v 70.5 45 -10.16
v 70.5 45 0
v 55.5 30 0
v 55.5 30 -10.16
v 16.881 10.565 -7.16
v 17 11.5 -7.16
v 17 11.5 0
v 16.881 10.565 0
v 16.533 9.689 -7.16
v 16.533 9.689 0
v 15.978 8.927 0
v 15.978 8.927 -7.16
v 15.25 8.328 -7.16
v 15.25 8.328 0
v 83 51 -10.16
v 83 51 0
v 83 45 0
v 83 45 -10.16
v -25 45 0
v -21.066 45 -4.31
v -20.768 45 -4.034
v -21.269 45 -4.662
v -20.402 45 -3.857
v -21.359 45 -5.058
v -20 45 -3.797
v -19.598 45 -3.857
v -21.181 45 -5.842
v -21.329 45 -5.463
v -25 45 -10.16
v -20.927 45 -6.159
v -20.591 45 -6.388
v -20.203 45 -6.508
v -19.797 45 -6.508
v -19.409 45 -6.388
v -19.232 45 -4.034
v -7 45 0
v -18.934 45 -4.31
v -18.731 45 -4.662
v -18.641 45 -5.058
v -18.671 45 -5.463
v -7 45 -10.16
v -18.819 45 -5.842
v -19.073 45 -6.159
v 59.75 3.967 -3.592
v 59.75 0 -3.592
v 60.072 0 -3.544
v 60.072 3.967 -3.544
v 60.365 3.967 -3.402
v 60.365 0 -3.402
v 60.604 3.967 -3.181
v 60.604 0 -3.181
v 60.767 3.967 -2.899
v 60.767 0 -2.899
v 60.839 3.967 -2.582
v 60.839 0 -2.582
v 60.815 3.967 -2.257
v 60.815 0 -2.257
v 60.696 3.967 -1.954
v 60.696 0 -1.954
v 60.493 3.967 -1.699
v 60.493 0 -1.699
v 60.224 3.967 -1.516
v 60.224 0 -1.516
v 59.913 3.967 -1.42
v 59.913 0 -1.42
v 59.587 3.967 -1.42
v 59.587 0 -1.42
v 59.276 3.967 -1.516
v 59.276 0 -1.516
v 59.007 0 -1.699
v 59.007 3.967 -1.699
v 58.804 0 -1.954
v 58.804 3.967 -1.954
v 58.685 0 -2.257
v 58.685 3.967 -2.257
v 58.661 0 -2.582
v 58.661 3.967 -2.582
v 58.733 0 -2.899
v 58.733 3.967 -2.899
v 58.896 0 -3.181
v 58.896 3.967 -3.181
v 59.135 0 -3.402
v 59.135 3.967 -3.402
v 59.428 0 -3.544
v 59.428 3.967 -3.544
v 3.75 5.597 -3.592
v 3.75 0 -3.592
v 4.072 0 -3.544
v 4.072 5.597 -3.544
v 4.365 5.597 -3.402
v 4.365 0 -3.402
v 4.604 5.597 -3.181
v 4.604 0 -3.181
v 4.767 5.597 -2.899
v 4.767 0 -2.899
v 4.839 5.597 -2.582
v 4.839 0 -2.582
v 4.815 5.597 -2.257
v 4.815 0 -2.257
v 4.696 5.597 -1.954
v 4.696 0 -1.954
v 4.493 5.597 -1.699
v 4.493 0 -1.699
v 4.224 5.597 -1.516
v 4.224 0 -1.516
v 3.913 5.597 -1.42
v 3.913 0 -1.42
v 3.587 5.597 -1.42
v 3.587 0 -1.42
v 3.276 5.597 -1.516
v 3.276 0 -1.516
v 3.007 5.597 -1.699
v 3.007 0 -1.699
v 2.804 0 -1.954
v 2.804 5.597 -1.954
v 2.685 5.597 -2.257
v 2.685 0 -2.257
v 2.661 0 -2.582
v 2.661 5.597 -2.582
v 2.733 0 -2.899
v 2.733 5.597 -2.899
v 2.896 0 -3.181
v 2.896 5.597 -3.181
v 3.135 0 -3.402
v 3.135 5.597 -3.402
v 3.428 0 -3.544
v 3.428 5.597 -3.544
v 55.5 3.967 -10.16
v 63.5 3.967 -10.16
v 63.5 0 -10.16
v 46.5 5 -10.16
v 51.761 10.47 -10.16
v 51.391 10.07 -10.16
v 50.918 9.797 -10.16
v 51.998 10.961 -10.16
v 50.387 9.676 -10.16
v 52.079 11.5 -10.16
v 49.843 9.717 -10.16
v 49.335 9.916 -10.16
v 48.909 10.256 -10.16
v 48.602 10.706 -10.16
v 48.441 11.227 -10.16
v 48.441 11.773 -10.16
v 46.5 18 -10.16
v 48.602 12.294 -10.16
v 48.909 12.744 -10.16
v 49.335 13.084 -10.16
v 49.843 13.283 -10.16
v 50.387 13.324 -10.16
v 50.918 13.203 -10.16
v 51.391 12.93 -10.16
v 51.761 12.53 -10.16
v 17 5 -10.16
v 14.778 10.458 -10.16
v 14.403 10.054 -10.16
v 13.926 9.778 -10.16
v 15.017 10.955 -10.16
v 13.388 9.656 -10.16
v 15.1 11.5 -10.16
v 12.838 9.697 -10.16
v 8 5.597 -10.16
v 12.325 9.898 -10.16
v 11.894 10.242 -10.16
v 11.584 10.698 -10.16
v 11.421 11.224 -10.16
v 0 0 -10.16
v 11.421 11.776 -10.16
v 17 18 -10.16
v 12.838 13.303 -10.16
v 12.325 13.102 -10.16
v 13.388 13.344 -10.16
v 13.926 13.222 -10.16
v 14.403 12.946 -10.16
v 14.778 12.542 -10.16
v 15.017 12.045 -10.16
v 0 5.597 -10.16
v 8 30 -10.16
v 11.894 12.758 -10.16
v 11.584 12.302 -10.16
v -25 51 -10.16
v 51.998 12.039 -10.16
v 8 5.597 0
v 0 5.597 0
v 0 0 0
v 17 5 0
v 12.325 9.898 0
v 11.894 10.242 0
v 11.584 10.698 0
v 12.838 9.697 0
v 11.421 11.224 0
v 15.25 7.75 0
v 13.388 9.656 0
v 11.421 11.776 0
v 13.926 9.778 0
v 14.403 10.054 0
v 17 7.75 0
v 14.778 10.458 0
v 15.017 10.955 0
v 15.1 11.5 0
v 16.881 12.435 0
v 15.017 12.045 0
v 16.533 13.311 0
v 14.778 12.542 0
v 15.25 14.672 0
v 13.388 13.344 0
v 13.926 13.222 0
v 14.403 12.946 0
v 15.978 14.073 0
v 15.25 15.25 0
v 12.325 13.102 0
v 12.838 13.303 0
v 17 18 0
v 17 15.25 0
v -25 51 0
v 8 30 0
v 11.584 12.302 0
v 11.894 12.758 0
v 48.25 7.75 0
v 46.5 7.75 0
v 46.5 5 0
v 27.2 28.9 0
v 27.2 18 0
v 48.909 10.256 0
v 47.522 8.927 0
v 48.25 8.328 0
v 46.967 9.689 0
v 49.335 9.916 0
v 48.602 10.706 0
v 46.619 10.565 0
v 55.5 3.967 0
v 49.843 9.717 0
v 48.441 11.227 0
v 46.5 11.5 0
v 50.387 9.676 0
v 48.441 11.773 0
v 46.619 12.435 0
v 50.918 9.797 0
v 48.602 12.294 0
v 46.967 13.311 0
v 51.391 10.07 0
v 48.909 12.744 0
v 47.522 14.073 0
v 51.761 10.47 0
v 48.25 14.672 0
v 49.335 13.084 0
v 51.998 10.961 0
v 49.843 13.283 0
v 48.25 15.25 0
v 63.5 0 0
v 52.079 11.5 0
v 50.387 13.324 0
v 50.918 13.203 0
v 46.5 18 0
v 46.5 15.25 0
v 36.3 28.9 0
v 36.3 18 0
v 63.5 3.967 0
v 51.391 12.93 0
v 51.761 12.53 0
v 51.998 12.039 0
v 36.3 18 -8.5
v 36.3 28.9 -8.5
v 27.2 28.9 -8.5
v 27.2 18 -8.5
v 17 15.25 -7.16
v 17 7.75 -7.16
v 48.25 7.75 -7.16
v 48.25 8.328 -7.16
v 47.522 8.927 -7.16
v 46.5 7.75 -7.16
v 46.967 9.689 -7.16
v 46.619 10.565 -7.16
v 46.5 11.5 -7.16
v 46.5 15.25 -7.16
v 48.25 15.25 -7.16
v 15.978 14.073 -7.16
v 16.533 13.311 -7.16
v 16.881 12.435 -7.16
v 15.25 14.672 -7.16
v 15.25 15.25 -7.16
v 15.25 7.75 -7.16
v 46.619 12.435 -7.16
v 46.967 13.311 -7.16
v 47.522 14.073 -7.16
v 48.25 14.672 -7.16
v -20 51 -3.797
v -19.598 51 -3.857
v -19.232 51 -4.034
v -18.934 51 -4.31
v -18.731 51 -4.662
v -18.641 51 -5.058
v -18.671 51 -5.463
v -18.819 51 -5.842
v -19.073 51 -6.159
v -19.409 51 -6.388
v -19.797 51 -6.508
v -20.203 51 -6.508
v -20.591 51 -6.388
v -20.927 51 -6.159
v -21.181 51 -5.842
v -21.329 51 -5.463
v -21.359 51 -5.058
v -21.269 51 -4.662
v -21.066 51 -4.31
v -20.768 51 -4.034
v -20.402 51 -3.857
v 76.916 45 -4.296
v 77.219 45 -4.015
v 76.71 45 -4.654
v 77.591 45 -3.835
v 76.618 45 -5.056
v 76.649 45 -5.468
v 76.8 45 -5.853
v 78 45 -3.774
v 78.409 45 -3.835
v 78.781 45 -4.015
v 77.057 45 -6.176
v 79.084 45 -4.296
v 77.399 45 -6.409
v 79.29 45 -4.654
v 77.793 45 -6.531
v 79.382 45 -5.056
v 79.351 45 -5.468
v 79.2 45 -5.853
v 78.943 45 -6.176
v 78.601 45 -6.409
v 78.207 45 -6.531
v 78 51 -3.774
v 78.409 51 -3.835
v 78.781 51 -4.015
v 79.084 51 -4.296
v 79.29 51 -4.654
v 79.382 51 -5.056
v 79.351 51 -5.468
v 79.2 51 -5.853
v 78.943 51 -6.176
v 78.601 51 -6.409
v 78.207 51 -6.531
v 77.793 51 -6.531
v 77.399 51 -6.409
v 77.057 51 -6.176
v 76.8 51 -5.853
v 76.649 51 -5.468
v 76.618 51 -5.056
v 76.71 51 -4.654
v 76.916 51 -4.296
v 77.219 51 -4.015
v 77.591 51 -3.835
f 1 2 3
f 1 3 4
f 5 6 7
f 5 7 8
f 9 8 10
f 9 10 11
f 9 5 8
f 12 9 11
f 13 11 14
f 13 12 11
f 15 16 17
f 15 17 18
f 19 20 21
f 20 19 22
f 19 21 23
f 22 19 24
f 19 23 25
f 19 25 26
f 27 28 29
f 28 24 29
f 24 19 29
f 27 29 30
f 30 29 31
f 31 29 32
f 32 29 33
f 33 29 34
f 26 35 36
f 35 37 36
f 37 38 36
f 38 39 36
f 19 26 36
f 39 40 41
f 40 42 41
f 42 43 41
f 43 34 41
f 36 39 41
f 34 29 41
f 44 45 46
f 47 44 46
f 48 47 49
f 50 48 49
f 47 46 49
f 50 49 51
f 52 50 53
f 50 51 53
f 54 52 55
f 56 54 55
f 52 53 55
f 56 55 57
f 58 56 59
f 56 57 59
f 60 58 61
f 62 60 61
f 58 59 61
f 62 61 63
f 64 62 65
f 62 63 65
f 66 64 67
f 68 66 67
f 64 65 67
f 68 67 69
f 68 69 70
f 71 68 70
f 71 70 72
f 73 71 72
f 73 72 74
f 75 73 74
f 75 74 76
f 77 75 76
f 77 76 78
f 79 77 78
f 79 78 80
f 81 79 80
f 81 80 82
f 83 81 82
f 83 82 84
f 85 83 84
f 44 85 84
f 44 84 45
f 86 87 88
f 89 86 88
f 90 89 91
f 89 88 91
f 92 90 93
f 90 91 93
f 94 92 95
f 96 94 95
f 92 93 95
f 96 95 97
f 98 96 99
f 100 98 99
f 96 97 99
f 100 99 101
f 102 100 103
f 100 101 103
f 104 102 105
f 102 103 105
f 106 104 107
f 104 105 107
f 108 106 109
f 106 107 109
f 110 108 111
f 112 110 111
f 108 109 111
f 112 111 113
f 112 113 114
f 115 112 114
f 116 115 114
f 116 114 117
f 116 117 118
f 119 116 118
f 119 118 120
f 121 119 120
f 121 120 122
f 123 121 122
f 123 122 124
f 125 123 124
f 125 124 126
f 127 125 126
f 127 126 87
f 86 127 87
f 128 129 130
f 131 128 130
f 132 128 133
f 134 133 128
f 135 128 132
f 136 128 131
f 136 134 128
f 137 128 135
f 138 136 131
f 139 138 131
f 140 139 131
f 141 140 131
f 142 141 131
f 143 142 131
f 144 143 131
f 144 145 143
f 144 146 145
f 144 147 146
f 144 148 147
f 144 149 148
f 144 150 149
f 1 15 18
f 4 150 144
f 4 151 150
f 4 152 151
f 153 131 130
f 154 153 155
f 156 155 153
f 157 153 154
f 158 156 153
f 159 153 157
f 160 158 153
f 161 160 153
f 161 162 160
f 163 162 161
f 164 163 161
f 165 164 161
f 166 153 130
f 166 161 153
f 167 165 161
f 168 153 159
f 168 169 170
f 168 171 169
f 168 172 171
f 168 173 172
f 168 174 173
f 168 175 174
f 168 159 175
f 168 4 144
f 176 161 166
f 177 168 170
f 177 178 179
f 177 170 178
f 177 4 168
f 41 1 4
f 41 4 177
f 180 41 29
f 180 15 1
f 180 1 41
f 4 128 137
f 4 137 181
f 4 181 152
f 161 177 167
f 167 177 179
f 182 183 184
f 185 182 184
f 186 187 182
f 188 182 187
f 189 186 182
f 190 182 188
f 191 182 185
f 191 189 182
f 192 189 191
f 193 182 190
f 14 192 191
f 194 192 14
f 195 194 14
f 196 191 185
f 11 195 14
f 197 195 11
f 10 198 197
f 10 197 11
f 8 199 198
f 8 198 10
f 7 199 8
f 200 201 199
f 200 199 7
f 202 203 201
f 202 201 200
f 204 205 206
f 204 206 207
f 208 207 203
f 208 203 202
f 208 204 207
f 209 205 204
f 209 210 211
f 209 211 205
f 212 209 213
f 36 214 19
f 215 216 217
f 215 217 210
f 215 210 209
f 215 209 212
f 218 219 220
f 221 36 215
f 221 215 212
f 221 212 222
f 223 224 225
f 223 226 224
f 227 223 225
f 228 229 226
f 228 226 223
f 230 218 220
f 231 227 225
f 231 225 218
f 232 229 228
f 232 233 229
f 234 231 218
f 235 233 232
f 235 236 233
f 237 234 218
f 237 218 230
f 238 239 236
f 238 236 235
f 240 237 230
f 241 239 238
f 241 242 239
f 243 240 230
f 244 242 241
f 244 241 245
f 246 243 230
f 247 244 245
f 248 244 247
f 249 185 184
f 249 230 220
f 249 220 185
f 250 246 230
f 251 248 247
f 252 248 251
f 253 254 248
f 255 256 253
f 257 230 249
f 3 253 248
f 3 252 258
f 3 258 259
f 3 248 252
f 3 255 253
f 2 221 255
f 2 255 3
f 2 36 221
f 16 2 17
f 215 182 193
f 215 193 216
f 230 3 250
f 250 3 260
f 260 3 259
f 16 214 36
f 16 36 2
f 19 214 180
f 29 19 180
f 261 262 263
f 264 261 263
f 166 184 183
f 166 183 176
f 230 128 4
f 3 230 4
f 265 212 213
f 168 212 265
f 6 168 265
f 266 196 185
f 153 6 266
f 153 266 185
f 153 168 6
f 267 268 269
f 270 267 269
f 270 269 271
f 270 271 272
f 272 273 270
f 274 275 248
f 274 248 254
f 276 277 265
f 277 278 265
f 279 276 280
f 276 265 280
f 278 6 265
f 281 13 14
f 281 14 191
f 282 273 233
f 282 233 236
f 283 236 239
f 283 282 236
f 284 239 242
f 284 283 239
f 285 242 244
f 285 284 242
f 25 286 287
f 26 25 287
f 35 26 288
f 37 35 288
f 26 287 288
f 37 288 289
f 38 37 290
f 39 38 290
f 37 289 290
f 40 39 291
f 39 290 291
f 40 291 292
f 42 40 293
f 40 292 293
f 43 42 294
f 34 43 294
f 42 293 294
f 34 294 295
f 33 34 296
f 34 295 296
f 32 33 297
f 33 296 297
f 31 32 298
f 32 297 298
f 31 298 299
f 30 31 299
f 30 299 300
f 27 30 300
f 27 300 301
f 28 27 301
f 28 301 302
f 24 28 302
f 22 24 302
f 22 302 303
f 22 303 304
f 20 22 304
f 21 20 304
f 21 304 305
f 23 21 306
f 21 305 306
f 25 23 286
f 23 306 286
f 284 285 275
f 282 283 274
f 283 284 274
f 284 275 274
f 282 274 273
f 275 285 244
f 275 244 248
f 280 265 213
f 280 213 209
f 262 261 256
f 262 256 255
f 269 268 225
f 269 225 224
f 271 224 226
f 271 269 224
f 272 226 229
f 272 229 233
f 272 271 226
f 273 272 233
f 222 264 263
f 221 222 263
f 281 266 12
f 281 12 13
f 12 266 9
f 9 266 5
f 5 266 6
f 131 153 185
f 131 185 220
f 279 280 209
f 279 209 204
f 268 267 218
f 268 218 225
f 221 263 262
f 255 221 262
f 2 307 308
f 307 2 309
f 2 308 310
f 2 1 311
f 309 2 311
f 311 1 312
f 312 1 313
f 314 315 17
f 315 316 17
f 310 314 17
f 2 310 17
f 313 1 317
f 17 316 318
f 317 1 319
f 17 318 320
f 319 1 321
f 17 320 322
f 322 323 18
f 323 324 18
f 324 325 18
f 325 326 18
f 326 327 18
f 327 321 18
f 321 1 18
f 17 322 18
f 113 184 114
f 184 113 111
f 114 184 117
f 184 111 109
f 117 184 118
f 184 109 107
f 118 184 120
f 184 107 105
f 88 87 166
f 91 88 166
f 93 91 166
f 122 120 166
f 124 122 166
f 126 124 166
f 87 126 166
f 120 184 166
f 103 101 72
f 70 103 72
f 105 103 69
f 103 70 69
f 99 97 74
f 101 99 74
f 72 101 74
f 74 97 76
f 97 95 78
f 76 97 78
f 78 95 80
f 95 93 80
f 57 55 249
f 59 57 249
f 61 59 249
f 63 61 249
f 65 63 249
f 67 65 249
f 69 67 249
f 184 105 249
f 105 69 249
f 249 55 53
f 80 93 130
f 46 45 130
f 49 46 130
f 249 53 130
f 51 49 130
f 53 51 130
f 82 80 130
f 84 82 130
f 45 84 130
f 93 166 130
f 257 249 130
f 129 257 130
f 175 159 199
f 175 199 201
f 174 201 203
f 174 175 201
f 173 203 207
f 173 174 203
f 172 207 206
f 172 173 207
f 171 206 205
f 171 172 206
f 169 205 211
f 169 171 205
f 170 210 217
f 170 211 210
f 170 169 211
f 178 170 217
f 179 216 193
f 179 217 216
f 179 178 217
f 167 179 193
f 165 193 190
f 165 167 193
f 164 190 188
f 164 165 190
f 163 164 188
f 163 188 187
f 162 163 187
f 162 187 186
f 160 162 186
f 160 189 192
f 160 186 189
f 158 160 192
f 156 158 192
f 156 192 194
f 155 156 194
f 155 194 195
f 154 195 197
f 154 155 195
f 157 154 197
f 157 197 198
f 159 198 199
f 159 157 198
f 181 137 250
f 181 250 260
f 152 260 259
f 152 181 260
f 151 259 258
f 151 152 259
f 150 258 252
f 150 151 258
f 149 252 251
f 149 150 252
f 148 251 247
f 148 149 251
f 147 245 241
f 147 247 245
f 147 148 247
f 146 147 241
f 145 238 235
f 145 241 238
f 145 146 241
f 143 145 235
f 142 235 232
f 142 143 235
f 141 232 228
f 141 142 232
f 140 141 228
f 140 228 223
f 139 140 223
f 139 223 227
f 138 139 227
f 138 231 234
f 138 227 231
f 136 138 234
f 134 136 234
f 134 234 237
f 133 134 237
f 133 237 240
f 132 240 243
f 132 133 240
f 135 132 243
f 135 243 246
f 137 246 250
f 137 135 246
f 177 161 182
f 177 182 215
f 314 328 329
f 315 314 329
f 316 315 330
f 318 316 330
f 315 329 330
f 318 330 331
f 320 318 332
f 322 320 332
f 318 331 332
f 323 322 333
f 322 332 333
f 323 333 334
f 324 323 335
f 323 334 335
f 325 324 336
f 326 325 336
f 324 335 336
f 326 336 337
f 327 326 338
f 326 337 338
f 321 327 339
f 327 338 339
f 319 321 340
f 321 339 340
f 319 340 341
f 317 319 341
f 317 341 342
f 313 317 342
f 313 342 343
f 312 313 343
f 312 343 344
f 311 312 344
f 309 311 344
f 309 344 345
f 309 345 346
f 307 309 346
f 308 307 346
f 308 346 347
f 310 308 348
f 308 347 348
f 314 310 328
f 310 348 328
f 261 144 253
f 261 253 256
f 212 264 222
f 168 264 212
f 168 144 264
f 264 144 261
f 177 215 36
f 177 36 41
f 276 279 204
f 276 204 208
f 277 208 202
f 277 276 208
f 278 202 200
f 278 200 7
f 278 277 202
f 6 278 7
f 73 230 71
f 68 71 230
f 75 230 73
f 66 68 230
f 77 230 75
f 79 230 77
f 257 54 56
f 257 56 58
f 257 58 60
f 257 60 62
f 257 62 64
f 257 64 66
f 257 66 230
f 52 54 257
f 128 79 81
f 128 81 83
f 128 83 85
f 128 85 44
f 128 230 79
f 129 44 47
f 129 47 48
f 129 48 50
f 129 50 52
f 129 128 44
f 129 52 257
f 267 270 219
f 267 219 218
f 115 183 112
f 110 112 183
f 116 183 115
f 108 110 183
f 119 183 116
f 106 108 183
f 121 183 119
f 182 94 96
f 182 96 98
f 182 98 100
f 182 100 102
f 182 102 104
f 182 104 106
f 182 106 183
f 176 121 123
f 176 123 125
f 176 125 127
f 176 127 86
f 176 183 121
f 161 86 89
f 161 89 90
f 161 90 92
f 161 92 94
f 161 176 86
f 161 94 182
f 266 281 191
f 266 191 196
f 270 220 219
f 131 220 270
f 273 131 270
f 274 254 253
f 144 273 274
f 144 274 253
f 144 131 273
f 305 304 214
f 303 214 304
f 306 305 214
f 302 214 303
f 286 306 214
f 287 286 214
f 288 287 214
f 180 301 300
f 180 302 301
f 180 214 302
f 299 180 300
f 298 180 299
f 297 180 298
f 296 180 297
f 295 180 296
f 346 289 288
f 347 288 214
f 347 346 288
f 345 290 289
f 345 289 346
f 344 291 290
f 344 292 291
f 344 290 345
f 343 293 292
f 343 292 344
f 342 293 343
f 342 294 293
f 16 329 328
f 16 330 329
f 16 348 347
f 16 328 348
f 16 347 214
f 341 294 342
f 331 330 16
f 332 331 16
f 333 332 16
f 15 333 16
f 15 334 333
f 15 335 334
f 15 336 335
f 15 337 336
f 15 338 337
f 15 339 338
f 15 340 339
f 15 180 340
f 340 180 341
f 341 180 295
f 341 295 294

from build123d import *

# Parameters (mm, degrees)
SKETCH1_W               = 63.5
SKETCH1_H               = 10.16
BOSS_EXTRUDE1_DEPTH     = 51
SKETCH2_R               = 1.0922
CUT_EXTRUDE1_DEPTH      = 10
CUT_EXTRUDE2_DEPTH      = 83.076035479
CUT_EXTRUDE2_DEPTH_BACK = 83.076035479
SKETCH3_W               = 8
SKETCH3_H               = 47.710038991
SKETCH3_H_2             = 48.198954848
SKETCH5_W               = 33
SKETCH5_H               = 10.16
SKETCH5_R               = 1.363261963
SKETCH5_W_2             = 27.5
SKETCH5_R_2             = 1.386126721
BOSS_EXTRUDE2_DEPTH     = 6
CHAMFER2_SIZE           = 15
CUT_EXTRUDE3_DEPTH      = 98.945013145
CUT_EXTRUDE3_DEPTH_BACK = 98.945013145
SKETCH6_W               = 9.1
SKETCH6_H               = 10.9
SKETCH6_R               = 1.849544376
SKETCH6_R_2             = 1.82922697
SKETCH7_W               = 9.1
SKETCH7_H               = 10.9
BOSS_EXTRUDE3_DEPTH     = 1.66
SKETCH8_W               = 1.75
SKETCH8_H               = 7.5
BOSS_EXTRUDE4_DEPTH     = 3


with BuildPart() as part:
    # Sketch1 → Boss-Extrude1 (new body)
    with BuildSketch(Plane(origin=(0, 0, 0), x_dir=(1, 0, 0), z_dir=(0, 1, 0))):
        with Locations((31.75, 5.08)):
            Rectangle(SKETCH1_W, SKETCH1_H)
    extrude(amount=BOSS_EXTRUDE1_DEPTH)

    # Sketch2 → Cut-Extrude1 (cut)
    with BuildSketch(Plane(origin=(0, 0, 0), x_dir=(-1, 0, 0), z_dir=(0, -1, 0))):
        with Locations(Location((-59.75, 2.5, 0), (0, 0, 90))):
            Circle(SKETCH2_R)
        with Locations(Location((-3.75, 2.5, 0), (0, 0, 90))):
            Circle(SKETCH2_R)
    extrude(amount=-CUT_EXTRUDE1_DEPTH, mode=Mode.SUBTRACT)

    # Sketch3 → Cut-Extrude2 (cut, two sides: drawn at the far end of the back side and taken through both)
    with BuildSketch(Plane.XY.offset(-CUT_EXTRUDE2_DEPTH_BACK)):
        with Locations((4, 29.452019142)):
            Rectangle(SKETCH3_W, SKETCH3_H)
        with Locations((59.5, 28.066757549)):
            Rectangle(SKETCH3_W, SKETCH3_H_2)
    extrude(amount=CUT_EXTRUDE2_DEPTH + CUT_EXTRUDE2_DEPTH_BACK, mode=Mode.SUBTRACT)

    # Sketch5 → Boss-Extrude2 (add)
    # profile 1 of 2: a face of its own
    with BuildSketch(Plane(origin=(0, 51, 0), x_dir=(1, 0, 0), z_dir=(0, 1, 0))):
        with Locations((-8.5, 5.08)):
            Rectangle(SKETCH5_W, SKETCH5_H)
        with Locations(Location((-20, 5.16, 0), (0, 0, 270))):
            Circle(SKETCH5_R, mode=Mode.SUBTRACT)
    # profile 2 of 2: a face of its own
    with BuildSketch(Plane(origin=(0, 51, 0), x_dir=(1, 0, 0), z_dir=(0, 1, 0))):
        with Locations((69.25, 5.08)):
            Rectangle(SKETCH5_W_2, SKETCH5_H)
        with Locations(Location((78, 5.16, 0), (0, 0, 270))):
            Circle(SKETCH5_R_2, mode=Mode.SUBTRACT)
    extrude(amount=-BOSS_EXTRUDE2_DEPTH)

    # Chamfer2
    chamfer2_edges = [part.edges().sort_by_distance(p)[0] for p in [
        (8, 45, -5.08),
        (55.5, 45, -5.08),
    ]]
    chamfer(chamfer2_edges, length=CHAMFER2_SIZE)

    # Sketch6 → Cut-Extrude3 (cut, two sides: drawn at the far end of the back side and taken through both)
    with BuildSketch(Plane.XY.offset(-CUT_EXTRUDE3_DEPTH_BACK)):
        with Locations((31.75, 23.45)):
            Rectangle(SKETCH6_W, SKETCH6_H)
        Polygon((27.2, 18), (17, 18), (17, 15.25), (17, 11.5), (17, 7.75), (17, 5), (46.5, 5), (46.5, 7.75), (46.5, 11.5), (46.5, 15.25), (46.5, 18), (36.3, 18), align=None)
        with BuildLine():
            Line((17, 11.5), (17, 15.25))
            Line((17, 15.25), (15.25, 15.25))
            Line((15.25, 15.25), (15.25, 14.672144385))
            ThreePointArc((15.25, 14.672144385), (16.533481384, 13.311422093), (17, 11.5))
        make_face()
        with BuildLine():
            Line((17, 7.75), (17, 11.5))
            ThreePointArc((17, 11.5), (16.533481384, 9.688577907), (15.25, 8.327855615))
            Line((15.25, 8.327855615), (15.25, 7.75))
            Line((15.25, 7.75), (17, 7.75))
        make_face()
        with Locations((13.25, 11.5)):
            Circle(SKETCH6_R)
        with Locations((50.25, 11.5)):
            Circle(SKETCH6_R_2)
        with BuildLine():
            Line((48.25, 15.25), (46.5, 15.25))
            Line((46.5, 15.25), (46.5, 11.5))
            ThreePointArc((46.5, 11.5), (46.966518616, 13.311422093), (48.25, 14.672144385))
            Line((48.25, 14.672144385), (48.25, 15.25))
        make_face()
        with BuildLine():
            ThreePointArc((48.25, 8.327855615), (46.966518616, 9.688577907), (46.5, 11.5))
            Line((46.5, 11.5), (46.5, 7.75))
            Line((46.5, 7.75), (48.25, 7.75))
            Line((48.25, 7.75), (48.25, 8.327855615))
        make_face()
    extrude(amount=CUT_EXTRUDE3_DEPTH + CUT_EXTRUDE3_DEPTH_BACK, mode=Mode.SUBTRACT)

    # Sketch7 → Boss-Extrude3 (add)
    with BuildSketch(Plane(origin=(0, 0, -10.16), x_dir=(-1, 0, 0), z_dir=(0, 0, -1))):
        with Locations((-31.75, 23.45)):
            Rectangle(SKETCH7_W, SKETCH7_H)
    extrude(amount=-BOSS_EXTRUDE3_DEPTH)

    # Sketch8 → Boss-Extrude4 (add)
    with BuildSketch(Plane(origin=(0, 0, -10.16), x_dir=(-1, 0, 0), z_dir=(0, 0, -1))):
        with Locations((-47.375, 11.5)):
            Rectangle(SKETCH8_W, SKETCH8_H)
        with Locations((-16.125, 11.5)):
            Rectangle(SKETCH8_W, SKETCH8_H)
    extrude(amount=-BOSS_EXTRUDE4_DEPTH)


solid = part.part
